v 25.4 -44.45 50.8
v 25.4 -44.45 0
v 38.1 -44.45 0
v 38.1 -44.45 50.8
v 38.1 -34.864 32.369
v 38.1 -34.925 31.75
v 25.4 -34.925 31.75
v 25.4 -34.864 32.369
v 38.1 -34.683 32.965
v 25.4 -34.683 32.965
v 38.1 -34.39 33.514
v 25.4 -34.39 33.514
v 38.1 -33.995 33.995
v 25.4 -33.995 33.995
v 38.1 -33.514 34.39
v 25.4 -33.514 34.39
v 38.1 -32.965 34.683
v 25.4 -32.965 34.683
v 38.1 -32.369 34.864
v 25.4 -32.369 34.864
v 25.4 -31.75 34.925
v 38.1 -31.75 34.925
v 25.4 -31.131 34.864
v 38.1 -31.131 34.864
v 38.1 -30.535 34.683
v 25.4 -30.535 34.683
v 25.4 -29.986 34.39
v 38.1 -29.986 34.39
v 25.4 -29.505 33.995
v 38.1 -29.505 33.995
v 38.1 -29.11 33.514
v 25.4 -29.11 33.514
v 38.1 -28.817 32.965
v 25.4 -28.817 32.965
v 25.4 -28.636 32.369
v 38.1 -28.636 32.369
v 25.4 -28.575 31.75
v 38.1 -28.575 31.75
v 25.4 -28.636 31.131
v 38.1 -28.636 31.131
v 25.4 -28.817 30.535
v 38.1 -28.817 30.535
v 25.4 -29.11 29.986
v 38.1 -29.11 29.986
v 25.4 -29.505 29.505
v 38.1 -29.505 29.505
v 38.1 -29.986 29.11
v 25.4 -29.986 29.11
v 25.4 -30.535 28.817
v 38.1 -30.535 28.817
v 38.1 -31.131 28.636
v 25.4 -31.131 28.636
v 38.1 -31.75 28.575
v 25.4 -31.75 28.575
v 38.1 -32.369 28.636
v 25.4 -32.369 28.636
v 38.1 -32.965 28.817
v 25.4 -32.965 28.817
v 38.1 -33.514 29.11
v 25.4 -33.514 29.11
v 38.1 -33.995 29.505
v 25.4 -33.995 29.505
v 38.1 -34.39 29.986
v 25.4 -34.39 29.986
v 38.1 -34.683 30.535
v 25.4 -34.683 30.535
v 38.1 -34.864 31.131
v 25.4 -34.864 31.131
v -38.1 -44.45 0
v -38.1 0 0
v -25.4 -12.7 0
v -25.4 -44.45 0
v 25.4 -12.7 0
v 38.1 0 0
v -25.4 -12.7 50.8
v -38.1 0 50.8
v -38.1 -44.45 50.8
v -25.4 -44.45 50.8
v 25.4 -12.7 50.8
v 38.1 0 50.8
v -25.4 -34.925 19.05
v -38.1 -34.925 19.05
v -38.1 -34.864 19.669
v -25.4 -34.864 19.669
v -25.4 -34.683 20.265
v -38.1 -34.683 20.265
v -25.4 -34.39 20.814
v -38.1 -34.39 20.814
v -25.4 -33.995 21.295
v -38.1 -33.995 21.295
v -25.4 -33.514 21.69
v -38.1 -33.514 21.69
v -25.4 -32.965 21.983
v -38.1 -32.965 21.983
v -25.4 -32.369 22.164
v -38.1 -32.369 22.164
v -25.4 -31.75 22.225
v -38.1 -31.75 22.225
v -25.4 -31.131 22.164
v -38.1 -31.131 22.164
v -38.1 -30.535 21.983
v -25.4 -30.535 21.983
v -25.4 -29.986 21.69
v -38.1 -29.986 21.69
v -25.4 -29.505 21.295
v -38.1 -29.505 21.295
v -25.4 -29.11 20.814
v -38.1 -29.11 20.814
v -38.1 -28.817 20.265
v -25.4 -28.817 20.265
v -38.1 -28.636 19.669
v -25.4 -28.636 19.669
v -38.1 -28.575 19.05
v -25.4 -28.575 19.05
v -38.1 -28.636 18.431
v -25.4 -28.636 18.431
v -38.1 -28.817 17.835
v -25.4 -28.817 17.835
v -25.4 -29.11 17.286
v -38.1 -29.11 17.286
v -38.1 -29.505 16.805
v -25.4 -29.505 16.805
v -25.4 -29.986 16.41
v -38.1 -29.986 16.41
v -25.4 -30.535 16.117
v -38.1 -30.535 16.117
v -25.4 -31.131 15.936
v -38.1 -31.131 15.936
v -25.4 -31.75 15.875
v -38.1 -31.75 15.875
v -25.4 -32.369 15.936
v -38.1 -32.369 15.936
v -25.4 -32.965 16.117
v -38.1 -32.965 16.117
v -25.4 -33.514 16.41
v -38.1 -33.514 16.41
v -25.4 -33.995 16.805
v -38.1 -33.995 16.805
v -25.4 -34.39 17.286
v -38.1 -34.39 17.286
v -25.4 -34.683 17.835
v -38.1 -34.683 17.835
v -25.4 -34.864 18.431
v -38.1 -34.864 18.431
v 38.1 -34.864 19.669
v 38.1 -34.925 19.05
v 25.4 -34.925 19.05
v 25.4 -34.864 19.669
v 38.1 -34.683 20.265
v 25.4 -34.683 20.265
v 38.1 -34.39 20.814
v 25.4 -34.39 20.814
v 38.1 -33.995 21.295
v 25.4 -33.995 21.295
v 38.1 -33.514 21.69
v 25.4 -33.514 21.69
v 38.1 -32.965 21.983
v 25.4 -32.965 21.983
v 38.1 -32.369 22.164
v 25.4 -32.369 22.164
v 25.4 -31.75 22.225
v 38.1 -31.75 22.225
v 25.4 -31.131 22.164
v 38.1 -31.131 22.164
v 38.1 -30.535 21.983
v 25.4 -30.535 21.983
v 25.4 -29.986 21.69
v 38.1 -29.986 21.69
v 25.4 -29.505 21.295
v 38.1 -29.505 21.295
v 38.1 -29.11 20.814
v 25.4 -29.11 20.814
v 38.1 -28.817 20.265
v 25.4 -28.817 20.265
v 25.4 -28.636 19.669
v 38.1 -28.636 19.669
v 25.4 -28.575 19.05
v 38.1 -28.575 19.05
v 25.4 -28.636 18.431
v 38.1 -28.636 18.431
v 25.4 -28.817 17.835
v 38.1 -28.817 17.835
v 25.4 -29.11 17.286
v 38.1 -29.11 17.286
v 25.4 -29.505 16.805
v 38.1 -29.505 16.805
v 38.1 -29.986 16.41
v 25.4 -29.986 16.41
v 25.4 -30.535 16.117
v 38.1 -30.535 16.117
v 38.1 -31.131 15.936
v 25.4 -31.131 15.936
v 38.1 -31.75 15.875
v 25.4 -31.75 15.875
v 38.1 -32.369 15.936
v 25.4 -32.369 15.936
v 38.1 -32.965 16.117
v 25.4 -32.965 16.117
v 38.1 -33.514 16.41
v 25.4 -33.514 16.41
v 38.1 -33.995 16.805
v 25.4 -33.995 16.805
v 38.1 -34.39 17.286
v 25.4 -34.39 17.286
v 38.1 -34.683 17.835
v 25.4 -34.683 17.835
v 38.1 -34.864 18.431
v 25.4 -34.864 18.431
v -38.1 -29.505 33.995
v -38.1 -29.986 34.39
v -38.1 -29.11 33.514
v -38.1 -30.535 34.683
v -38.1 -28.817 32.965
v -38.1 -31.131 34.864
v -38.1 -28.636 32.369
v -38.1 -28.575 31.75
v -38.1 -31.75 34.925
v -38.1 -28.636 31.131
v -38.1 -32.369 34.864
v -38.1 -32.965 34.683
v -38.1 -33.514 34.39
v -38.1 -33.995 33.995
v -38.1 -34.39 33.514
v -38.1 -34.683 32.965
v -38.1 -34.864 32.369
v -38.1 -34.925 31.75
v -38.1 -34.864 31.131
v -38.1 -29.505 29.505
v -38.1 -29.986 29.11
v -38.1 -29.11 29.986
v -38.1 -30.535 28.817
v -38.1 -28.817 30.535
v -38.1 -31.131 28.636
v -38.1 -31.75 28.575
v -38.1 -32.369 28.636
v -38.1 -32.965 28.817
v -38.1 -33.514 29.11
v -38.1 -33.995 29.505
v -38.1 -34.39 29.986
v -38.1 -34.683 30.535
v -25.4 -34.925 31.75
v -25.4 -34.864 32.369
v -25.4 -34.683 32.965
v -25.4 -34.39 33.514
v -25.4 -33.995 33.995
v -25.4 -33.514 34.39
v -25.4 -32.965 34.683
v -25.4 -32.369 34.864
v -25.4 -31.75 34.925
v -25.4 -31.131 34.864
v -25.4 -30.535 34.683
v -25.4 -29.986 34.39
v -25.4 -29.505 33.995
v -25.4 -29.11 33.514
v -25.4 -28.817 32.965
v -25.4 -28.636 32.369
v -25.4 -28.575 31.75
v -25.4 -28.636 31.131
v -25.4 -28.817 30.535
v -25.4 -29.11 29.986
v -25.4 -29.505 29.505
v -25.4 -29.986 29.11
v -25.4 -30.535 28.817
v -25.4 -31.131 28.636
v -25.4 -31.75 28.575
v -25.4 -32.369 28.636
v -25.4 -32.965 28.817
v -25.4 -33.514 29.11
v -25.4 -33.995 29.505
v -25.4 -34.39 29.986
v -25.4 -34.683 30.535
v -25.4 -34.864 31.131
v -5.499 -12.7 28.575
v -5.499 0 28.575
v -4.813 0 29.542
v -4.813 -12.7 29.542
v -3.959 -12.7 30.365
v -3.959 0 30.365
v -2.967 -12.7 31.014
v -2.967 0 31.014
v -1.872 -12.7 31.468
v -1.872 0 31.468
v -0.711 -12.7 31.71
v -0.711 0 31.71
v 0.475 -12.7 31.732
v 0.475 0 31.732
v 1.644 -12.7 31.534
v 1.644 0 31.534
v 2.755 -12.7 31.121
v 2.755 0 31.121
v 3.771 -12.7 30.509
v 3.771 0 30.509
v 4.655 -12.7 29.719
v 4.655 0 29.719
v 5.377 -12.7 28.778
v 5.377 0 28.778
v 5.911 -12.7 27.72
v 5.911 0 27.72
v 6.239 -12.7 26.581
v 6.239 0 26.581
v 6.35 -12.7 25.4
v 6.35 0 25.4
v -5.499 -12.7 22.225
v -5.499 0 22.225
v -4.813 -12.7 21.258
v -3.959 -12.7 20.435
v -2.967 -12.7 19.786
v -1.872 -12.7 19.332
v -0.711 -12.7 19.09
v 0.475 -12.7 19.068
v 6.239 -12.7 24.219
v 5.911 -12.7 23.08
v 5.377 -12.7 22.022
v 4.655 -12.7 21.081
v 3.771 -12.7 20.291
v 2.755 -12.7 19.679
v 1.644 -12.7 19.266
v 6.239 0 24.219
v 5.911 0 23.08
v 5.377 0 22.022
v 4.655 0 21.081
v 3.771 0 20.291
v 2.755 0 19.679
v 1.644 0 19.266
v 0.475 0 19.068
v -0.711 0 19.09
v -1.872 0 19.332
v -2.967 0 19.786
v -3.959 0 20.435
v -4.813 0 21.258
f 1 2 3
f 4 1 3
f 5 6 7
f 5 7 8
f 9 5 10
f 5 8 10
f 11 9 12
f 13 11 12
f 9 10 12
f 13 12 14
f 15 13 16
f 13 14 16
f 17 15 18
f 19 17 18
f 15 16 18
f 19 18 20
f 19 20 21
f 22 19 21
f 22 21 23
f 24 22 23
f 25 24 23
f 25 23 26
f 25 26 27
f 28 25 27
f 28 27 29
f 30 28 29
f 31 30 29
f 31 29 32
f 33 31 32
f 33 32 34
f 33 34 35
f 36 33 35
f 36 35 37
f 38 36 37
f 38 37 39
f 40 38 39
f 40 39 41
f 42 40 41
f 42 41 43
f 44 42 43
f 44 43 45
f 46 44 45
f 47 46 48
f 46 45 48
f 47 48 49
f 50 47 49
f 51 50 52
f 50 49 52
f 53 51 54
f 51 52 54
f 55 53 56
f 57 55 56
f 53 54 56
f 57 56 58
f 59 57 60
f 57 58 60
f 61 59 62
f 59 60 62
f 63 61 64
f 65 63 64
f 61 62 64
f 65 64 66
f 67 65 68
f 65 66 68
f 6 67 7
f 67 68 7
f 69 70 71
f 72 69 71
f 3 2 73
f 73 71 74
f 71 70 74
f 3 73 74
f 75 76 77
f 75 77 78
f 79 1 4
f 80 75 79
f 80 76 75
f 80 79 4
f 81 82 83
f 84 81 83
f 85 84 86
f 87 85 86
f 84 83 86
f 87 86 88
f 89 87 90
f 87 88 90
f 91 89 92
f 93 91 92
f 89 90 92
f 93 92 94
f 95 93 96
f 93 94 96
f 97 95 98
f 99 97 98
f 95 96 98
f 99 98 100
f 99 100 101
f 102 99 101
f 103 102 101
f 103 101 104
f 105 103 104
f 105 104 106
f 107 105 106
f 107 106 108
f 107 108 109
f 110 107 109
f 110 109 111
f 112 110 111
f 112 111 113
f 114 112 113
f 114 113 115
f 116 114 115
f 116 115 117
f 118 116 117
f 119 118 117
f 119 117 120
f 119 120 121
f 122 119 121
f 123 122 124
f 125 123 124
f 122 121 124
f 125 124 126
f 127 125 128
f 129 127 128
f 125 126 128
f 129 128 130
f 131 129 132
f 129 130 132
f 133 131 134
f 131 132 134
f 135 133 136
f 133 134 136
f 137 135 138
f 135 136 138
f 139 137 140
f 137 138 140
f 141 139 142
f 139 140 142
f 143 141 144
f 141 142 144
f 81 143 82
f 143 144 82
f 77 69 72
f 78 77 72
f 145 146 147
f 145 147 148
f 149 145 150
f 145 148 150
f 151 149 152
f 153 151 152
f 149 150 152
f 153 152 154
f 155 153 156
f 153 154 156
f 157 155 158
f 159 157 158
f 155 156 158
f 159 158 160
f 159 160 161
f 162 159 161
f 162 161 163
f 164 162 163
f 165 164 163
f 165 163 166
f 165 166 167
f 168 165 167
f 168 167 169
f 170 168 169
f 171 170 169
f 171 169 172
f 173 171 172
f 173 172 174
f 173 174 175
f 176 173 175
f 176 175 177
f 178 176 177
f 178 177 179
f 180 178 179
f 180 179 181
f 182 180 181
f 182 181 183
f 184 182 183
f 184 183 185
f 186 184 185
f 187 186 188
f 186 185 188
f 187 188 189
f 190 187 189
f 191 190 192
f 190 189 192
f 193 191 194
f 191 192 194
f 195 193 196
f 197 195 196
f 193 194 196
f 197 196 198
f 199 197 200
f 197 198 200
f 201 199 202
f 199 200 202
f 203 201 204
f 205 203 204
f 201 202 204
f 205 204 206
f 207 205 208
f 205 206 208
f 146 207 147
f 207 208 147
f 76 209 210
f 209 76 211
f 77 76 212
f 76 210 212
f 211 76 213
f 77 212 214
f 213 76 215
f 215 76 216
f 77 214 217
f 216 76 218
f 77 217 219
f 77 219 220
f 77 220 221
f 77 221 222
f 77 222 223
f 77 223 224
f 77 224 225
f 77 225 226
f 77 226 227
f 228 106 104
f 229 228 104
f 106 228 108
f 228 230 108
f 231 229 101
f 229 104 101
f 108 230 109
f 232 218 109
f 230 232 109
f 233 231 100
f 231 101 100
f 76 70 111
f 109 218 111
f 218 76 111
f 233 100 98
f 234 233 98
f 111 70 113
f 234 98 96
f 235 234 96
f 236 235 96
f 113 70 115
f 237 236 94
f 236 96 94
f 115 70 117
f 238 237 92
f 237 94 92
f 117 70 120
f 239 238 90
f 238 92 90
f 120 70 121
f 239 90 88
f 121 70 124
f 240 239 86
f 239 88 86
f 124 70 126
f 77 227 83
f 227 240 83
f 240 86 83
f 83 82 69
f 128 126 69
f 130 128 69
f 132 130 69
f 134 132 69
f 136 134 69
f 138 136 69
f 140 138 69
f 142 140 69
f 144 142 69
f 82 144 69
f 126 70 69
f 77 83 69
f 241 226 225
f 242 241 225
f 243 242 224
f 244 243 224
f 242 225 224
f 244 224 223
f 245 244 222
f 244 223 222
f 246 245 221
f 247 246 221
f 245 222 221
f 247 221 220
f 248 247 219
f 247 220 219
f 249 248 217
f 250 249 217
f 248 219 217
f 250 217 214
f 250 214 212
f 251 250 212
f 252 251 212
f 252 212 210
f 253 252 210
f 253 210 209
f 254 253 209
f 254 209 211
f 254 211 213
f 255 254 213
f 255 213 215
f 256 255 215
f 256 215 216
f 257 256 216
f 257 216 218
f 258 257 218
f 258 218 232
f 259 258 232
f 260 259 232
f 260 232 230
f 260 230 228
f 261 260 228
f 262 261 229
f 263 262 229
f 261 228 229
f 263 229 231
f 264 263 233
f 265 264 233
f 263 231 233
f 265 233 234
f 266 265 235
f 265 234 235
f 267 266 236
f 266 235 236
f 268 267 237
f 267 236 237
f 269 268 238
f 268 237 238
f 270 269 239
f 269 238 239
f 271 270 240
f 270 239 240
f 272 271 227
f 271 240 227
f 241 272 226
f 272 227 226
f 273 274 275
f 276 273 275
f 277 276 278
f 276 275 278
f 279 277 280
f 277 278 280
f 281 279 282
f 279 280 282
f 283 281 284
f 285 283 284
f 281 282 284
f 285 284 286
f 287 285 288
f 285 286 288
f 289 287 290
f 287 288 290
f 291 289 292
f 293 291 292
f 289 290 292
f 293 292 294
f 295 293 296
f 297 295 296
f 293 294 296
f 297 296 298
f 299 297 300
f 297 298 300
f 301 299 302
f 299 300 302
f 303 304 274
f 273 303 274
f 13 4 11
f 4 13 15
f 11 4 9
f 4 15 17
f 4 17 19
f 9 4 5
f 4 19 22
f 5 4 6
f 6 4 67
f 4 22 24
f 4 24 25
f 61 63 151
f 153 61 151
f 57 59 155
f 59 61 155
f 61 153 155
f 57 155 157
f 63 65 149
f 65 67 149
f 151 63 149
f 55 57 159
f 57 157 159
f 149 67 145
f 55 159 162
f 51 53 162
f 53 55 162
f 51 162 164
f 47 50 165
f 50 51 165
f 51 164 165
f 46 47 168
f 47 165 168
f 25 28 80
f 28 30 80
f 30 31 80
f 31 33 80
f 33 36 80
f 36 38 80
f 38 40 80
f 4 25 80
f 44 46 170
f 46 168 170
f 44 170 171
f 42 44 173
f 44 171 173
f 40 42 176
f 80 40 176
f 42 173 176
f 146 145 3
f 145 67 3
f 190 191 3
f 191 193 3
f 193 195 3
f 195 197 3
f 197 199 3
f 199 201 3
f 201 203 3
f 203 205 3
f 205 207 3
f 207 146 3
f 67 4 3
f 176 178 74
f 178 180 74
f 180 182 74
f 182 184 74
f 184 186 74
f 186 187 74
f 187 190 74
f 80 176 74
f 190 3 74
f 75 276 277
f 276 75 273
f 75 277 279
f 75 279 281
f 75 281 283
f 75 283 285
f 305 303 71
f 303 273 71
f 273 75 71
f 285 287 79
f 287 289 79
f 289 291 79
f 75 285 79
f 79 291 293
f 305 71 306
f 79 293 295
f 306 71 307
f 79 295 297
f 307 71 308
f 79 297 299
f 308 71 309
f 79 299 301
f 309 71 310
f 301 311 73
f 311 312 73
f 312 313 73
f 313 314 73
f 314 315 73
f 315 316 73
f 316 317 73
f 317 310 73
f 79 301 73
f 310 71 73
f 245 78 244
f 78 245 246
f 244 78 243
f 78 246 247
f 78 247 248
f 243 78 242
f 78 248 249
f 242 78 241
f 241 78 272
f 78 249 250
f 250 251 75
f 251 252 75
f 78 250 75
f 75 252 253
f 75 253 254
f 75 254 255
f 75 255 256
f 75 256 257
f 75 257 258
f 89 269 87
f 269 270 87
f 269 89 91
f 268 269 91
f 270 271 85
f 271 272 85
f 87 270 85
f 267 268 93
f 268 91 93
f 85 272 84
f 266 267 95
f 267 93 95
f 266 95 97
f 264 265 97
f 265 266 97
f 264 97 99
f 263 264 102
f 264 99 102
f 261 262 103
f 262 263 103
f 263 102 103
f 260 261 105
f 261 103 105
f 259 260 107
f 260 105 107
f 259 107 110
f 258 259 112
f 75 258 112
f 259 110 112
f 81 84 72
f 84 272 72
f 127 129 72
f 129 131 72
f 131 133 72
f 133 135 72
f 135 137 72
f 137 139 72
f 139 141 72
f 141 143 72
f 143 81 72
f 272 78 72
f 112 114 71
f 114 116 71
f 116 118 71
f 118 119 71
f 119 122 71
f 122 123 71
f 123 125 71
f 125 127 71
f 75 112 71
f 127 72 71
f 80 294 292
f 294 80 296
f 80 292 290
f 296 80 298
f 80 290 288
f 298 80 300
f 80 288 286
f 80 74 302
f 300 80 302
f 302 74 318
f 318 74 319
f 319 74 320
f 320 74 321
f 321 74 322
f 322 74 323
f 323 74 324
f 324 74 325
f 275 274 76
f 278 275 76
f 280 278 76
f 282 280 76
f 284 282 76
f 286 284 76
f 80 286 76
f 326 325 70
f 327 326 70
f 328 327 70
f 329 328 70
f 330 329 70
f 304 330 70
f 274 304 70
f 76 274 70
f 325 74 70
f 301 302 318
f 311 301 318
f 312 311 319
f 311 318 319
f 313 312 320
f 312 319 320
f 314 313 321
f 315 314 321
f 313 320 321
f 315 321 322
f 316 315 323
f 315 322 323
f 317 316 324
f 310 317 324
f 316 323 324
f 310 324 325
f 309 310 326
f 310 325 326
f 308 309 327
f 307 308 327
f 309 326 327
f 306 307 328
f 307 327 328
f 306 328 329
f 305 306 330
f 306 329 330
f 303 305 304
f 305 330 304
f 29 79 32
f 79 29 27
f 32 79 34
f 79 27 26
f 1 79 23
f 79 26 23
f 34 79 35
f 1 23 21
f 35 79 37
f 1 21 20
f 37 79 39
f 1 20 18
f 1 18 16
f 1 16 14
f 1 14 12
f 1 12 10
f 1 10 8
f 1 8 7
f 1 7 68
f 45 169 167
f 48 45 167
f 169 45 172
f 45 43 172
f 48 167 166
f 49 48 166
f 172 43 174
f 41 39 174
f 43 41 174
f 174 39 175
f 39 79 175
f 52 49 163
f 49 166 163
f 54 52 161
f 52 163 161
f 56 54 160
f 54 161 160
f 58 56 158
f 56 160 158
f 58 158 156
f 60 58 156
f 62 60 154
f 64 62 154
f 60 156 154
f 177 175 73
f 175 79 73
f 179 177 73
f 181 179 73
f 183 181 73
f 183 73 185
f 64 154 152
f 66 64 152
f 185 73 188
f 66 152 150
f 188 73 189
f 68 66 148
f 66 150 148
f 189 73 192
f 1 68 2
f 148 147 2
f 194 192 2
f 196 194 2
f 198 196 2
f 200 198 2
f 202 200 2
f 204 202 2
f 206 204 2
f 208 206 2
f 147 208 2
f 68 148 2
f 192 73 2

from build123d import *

# Parameters (mm, degrees)
BOSS_EXTRUDE1_DEPTH = 50.8
CUT_EXTRUDE1_REACH  = 79.512
SKETCH4_R           = 3.175
CUT_EXTRUDE2_DEPTH  = 83.8


with BuildPart() as part:
    # Sketch2 → Boss-Extrude1 (new body)
    with BuildSketch(Plane.XY):
        Polygon((38.1, 0), (-38.1, 0), (-38.1, -44.45), (-25.4, -44.45), (-25.4, -12.7), (25.4, -12.7), (25.4, -44.45), (38.1, -44.45), align=None)
    extrude(amount=BOSS_EXTRUDE1_DEPTH)

    # Sketch3 → Cut-Extrude1 (cut, up to next)
    with BuildSketch(Plane(origin=(0, 0, 0), x_dir=(1, 0, 0), z_dir=(0, 1, 0)), mode=Mode.PRIVATE) as cut_extrude1_sk1:
        with BuildLine():
            ThreePointArc((6.35, -25.4), (1.643500936, -19.266371003), (-5.499261314, -22.225))
            Line((-5.499261314, -22.225), (-5.499261314, -28.575))
            ThreePointArc((-5.499261314, -28.575), (1.643500936, -31.533628997), (6.35, -25.4))
        make_face()
    cut_extrude1_tool1 = extrude(cut_extrude1_sk1.sketch, amount=-CUT_EXTRUDE1_REACH, mode=Mode.PRIVATE) & part.part
    add(cut_extrude1_tool1.solids().sort_by_distance((0.17344, 0, 25.4))[0], mode=Mode.SUBTRACT)

    # Sketch4 → Cut-Extrude2 (cut)
    with BuildSketch(Plane.ZY.offset(38.1)):
        with Locations(Location((19.05, -31.75, 0), (0, 0, 270))):
            Circle(SKETCH4_R)
        with Locations(Location((31.75, -31.75, 0), (0, 0, 270))):
            Circle(SKETCH4_R)
    extrude(amount=-CUT_EXTRUDE2_DEPTH, mode=Mode.SUBTRACT)


solid = part.part
